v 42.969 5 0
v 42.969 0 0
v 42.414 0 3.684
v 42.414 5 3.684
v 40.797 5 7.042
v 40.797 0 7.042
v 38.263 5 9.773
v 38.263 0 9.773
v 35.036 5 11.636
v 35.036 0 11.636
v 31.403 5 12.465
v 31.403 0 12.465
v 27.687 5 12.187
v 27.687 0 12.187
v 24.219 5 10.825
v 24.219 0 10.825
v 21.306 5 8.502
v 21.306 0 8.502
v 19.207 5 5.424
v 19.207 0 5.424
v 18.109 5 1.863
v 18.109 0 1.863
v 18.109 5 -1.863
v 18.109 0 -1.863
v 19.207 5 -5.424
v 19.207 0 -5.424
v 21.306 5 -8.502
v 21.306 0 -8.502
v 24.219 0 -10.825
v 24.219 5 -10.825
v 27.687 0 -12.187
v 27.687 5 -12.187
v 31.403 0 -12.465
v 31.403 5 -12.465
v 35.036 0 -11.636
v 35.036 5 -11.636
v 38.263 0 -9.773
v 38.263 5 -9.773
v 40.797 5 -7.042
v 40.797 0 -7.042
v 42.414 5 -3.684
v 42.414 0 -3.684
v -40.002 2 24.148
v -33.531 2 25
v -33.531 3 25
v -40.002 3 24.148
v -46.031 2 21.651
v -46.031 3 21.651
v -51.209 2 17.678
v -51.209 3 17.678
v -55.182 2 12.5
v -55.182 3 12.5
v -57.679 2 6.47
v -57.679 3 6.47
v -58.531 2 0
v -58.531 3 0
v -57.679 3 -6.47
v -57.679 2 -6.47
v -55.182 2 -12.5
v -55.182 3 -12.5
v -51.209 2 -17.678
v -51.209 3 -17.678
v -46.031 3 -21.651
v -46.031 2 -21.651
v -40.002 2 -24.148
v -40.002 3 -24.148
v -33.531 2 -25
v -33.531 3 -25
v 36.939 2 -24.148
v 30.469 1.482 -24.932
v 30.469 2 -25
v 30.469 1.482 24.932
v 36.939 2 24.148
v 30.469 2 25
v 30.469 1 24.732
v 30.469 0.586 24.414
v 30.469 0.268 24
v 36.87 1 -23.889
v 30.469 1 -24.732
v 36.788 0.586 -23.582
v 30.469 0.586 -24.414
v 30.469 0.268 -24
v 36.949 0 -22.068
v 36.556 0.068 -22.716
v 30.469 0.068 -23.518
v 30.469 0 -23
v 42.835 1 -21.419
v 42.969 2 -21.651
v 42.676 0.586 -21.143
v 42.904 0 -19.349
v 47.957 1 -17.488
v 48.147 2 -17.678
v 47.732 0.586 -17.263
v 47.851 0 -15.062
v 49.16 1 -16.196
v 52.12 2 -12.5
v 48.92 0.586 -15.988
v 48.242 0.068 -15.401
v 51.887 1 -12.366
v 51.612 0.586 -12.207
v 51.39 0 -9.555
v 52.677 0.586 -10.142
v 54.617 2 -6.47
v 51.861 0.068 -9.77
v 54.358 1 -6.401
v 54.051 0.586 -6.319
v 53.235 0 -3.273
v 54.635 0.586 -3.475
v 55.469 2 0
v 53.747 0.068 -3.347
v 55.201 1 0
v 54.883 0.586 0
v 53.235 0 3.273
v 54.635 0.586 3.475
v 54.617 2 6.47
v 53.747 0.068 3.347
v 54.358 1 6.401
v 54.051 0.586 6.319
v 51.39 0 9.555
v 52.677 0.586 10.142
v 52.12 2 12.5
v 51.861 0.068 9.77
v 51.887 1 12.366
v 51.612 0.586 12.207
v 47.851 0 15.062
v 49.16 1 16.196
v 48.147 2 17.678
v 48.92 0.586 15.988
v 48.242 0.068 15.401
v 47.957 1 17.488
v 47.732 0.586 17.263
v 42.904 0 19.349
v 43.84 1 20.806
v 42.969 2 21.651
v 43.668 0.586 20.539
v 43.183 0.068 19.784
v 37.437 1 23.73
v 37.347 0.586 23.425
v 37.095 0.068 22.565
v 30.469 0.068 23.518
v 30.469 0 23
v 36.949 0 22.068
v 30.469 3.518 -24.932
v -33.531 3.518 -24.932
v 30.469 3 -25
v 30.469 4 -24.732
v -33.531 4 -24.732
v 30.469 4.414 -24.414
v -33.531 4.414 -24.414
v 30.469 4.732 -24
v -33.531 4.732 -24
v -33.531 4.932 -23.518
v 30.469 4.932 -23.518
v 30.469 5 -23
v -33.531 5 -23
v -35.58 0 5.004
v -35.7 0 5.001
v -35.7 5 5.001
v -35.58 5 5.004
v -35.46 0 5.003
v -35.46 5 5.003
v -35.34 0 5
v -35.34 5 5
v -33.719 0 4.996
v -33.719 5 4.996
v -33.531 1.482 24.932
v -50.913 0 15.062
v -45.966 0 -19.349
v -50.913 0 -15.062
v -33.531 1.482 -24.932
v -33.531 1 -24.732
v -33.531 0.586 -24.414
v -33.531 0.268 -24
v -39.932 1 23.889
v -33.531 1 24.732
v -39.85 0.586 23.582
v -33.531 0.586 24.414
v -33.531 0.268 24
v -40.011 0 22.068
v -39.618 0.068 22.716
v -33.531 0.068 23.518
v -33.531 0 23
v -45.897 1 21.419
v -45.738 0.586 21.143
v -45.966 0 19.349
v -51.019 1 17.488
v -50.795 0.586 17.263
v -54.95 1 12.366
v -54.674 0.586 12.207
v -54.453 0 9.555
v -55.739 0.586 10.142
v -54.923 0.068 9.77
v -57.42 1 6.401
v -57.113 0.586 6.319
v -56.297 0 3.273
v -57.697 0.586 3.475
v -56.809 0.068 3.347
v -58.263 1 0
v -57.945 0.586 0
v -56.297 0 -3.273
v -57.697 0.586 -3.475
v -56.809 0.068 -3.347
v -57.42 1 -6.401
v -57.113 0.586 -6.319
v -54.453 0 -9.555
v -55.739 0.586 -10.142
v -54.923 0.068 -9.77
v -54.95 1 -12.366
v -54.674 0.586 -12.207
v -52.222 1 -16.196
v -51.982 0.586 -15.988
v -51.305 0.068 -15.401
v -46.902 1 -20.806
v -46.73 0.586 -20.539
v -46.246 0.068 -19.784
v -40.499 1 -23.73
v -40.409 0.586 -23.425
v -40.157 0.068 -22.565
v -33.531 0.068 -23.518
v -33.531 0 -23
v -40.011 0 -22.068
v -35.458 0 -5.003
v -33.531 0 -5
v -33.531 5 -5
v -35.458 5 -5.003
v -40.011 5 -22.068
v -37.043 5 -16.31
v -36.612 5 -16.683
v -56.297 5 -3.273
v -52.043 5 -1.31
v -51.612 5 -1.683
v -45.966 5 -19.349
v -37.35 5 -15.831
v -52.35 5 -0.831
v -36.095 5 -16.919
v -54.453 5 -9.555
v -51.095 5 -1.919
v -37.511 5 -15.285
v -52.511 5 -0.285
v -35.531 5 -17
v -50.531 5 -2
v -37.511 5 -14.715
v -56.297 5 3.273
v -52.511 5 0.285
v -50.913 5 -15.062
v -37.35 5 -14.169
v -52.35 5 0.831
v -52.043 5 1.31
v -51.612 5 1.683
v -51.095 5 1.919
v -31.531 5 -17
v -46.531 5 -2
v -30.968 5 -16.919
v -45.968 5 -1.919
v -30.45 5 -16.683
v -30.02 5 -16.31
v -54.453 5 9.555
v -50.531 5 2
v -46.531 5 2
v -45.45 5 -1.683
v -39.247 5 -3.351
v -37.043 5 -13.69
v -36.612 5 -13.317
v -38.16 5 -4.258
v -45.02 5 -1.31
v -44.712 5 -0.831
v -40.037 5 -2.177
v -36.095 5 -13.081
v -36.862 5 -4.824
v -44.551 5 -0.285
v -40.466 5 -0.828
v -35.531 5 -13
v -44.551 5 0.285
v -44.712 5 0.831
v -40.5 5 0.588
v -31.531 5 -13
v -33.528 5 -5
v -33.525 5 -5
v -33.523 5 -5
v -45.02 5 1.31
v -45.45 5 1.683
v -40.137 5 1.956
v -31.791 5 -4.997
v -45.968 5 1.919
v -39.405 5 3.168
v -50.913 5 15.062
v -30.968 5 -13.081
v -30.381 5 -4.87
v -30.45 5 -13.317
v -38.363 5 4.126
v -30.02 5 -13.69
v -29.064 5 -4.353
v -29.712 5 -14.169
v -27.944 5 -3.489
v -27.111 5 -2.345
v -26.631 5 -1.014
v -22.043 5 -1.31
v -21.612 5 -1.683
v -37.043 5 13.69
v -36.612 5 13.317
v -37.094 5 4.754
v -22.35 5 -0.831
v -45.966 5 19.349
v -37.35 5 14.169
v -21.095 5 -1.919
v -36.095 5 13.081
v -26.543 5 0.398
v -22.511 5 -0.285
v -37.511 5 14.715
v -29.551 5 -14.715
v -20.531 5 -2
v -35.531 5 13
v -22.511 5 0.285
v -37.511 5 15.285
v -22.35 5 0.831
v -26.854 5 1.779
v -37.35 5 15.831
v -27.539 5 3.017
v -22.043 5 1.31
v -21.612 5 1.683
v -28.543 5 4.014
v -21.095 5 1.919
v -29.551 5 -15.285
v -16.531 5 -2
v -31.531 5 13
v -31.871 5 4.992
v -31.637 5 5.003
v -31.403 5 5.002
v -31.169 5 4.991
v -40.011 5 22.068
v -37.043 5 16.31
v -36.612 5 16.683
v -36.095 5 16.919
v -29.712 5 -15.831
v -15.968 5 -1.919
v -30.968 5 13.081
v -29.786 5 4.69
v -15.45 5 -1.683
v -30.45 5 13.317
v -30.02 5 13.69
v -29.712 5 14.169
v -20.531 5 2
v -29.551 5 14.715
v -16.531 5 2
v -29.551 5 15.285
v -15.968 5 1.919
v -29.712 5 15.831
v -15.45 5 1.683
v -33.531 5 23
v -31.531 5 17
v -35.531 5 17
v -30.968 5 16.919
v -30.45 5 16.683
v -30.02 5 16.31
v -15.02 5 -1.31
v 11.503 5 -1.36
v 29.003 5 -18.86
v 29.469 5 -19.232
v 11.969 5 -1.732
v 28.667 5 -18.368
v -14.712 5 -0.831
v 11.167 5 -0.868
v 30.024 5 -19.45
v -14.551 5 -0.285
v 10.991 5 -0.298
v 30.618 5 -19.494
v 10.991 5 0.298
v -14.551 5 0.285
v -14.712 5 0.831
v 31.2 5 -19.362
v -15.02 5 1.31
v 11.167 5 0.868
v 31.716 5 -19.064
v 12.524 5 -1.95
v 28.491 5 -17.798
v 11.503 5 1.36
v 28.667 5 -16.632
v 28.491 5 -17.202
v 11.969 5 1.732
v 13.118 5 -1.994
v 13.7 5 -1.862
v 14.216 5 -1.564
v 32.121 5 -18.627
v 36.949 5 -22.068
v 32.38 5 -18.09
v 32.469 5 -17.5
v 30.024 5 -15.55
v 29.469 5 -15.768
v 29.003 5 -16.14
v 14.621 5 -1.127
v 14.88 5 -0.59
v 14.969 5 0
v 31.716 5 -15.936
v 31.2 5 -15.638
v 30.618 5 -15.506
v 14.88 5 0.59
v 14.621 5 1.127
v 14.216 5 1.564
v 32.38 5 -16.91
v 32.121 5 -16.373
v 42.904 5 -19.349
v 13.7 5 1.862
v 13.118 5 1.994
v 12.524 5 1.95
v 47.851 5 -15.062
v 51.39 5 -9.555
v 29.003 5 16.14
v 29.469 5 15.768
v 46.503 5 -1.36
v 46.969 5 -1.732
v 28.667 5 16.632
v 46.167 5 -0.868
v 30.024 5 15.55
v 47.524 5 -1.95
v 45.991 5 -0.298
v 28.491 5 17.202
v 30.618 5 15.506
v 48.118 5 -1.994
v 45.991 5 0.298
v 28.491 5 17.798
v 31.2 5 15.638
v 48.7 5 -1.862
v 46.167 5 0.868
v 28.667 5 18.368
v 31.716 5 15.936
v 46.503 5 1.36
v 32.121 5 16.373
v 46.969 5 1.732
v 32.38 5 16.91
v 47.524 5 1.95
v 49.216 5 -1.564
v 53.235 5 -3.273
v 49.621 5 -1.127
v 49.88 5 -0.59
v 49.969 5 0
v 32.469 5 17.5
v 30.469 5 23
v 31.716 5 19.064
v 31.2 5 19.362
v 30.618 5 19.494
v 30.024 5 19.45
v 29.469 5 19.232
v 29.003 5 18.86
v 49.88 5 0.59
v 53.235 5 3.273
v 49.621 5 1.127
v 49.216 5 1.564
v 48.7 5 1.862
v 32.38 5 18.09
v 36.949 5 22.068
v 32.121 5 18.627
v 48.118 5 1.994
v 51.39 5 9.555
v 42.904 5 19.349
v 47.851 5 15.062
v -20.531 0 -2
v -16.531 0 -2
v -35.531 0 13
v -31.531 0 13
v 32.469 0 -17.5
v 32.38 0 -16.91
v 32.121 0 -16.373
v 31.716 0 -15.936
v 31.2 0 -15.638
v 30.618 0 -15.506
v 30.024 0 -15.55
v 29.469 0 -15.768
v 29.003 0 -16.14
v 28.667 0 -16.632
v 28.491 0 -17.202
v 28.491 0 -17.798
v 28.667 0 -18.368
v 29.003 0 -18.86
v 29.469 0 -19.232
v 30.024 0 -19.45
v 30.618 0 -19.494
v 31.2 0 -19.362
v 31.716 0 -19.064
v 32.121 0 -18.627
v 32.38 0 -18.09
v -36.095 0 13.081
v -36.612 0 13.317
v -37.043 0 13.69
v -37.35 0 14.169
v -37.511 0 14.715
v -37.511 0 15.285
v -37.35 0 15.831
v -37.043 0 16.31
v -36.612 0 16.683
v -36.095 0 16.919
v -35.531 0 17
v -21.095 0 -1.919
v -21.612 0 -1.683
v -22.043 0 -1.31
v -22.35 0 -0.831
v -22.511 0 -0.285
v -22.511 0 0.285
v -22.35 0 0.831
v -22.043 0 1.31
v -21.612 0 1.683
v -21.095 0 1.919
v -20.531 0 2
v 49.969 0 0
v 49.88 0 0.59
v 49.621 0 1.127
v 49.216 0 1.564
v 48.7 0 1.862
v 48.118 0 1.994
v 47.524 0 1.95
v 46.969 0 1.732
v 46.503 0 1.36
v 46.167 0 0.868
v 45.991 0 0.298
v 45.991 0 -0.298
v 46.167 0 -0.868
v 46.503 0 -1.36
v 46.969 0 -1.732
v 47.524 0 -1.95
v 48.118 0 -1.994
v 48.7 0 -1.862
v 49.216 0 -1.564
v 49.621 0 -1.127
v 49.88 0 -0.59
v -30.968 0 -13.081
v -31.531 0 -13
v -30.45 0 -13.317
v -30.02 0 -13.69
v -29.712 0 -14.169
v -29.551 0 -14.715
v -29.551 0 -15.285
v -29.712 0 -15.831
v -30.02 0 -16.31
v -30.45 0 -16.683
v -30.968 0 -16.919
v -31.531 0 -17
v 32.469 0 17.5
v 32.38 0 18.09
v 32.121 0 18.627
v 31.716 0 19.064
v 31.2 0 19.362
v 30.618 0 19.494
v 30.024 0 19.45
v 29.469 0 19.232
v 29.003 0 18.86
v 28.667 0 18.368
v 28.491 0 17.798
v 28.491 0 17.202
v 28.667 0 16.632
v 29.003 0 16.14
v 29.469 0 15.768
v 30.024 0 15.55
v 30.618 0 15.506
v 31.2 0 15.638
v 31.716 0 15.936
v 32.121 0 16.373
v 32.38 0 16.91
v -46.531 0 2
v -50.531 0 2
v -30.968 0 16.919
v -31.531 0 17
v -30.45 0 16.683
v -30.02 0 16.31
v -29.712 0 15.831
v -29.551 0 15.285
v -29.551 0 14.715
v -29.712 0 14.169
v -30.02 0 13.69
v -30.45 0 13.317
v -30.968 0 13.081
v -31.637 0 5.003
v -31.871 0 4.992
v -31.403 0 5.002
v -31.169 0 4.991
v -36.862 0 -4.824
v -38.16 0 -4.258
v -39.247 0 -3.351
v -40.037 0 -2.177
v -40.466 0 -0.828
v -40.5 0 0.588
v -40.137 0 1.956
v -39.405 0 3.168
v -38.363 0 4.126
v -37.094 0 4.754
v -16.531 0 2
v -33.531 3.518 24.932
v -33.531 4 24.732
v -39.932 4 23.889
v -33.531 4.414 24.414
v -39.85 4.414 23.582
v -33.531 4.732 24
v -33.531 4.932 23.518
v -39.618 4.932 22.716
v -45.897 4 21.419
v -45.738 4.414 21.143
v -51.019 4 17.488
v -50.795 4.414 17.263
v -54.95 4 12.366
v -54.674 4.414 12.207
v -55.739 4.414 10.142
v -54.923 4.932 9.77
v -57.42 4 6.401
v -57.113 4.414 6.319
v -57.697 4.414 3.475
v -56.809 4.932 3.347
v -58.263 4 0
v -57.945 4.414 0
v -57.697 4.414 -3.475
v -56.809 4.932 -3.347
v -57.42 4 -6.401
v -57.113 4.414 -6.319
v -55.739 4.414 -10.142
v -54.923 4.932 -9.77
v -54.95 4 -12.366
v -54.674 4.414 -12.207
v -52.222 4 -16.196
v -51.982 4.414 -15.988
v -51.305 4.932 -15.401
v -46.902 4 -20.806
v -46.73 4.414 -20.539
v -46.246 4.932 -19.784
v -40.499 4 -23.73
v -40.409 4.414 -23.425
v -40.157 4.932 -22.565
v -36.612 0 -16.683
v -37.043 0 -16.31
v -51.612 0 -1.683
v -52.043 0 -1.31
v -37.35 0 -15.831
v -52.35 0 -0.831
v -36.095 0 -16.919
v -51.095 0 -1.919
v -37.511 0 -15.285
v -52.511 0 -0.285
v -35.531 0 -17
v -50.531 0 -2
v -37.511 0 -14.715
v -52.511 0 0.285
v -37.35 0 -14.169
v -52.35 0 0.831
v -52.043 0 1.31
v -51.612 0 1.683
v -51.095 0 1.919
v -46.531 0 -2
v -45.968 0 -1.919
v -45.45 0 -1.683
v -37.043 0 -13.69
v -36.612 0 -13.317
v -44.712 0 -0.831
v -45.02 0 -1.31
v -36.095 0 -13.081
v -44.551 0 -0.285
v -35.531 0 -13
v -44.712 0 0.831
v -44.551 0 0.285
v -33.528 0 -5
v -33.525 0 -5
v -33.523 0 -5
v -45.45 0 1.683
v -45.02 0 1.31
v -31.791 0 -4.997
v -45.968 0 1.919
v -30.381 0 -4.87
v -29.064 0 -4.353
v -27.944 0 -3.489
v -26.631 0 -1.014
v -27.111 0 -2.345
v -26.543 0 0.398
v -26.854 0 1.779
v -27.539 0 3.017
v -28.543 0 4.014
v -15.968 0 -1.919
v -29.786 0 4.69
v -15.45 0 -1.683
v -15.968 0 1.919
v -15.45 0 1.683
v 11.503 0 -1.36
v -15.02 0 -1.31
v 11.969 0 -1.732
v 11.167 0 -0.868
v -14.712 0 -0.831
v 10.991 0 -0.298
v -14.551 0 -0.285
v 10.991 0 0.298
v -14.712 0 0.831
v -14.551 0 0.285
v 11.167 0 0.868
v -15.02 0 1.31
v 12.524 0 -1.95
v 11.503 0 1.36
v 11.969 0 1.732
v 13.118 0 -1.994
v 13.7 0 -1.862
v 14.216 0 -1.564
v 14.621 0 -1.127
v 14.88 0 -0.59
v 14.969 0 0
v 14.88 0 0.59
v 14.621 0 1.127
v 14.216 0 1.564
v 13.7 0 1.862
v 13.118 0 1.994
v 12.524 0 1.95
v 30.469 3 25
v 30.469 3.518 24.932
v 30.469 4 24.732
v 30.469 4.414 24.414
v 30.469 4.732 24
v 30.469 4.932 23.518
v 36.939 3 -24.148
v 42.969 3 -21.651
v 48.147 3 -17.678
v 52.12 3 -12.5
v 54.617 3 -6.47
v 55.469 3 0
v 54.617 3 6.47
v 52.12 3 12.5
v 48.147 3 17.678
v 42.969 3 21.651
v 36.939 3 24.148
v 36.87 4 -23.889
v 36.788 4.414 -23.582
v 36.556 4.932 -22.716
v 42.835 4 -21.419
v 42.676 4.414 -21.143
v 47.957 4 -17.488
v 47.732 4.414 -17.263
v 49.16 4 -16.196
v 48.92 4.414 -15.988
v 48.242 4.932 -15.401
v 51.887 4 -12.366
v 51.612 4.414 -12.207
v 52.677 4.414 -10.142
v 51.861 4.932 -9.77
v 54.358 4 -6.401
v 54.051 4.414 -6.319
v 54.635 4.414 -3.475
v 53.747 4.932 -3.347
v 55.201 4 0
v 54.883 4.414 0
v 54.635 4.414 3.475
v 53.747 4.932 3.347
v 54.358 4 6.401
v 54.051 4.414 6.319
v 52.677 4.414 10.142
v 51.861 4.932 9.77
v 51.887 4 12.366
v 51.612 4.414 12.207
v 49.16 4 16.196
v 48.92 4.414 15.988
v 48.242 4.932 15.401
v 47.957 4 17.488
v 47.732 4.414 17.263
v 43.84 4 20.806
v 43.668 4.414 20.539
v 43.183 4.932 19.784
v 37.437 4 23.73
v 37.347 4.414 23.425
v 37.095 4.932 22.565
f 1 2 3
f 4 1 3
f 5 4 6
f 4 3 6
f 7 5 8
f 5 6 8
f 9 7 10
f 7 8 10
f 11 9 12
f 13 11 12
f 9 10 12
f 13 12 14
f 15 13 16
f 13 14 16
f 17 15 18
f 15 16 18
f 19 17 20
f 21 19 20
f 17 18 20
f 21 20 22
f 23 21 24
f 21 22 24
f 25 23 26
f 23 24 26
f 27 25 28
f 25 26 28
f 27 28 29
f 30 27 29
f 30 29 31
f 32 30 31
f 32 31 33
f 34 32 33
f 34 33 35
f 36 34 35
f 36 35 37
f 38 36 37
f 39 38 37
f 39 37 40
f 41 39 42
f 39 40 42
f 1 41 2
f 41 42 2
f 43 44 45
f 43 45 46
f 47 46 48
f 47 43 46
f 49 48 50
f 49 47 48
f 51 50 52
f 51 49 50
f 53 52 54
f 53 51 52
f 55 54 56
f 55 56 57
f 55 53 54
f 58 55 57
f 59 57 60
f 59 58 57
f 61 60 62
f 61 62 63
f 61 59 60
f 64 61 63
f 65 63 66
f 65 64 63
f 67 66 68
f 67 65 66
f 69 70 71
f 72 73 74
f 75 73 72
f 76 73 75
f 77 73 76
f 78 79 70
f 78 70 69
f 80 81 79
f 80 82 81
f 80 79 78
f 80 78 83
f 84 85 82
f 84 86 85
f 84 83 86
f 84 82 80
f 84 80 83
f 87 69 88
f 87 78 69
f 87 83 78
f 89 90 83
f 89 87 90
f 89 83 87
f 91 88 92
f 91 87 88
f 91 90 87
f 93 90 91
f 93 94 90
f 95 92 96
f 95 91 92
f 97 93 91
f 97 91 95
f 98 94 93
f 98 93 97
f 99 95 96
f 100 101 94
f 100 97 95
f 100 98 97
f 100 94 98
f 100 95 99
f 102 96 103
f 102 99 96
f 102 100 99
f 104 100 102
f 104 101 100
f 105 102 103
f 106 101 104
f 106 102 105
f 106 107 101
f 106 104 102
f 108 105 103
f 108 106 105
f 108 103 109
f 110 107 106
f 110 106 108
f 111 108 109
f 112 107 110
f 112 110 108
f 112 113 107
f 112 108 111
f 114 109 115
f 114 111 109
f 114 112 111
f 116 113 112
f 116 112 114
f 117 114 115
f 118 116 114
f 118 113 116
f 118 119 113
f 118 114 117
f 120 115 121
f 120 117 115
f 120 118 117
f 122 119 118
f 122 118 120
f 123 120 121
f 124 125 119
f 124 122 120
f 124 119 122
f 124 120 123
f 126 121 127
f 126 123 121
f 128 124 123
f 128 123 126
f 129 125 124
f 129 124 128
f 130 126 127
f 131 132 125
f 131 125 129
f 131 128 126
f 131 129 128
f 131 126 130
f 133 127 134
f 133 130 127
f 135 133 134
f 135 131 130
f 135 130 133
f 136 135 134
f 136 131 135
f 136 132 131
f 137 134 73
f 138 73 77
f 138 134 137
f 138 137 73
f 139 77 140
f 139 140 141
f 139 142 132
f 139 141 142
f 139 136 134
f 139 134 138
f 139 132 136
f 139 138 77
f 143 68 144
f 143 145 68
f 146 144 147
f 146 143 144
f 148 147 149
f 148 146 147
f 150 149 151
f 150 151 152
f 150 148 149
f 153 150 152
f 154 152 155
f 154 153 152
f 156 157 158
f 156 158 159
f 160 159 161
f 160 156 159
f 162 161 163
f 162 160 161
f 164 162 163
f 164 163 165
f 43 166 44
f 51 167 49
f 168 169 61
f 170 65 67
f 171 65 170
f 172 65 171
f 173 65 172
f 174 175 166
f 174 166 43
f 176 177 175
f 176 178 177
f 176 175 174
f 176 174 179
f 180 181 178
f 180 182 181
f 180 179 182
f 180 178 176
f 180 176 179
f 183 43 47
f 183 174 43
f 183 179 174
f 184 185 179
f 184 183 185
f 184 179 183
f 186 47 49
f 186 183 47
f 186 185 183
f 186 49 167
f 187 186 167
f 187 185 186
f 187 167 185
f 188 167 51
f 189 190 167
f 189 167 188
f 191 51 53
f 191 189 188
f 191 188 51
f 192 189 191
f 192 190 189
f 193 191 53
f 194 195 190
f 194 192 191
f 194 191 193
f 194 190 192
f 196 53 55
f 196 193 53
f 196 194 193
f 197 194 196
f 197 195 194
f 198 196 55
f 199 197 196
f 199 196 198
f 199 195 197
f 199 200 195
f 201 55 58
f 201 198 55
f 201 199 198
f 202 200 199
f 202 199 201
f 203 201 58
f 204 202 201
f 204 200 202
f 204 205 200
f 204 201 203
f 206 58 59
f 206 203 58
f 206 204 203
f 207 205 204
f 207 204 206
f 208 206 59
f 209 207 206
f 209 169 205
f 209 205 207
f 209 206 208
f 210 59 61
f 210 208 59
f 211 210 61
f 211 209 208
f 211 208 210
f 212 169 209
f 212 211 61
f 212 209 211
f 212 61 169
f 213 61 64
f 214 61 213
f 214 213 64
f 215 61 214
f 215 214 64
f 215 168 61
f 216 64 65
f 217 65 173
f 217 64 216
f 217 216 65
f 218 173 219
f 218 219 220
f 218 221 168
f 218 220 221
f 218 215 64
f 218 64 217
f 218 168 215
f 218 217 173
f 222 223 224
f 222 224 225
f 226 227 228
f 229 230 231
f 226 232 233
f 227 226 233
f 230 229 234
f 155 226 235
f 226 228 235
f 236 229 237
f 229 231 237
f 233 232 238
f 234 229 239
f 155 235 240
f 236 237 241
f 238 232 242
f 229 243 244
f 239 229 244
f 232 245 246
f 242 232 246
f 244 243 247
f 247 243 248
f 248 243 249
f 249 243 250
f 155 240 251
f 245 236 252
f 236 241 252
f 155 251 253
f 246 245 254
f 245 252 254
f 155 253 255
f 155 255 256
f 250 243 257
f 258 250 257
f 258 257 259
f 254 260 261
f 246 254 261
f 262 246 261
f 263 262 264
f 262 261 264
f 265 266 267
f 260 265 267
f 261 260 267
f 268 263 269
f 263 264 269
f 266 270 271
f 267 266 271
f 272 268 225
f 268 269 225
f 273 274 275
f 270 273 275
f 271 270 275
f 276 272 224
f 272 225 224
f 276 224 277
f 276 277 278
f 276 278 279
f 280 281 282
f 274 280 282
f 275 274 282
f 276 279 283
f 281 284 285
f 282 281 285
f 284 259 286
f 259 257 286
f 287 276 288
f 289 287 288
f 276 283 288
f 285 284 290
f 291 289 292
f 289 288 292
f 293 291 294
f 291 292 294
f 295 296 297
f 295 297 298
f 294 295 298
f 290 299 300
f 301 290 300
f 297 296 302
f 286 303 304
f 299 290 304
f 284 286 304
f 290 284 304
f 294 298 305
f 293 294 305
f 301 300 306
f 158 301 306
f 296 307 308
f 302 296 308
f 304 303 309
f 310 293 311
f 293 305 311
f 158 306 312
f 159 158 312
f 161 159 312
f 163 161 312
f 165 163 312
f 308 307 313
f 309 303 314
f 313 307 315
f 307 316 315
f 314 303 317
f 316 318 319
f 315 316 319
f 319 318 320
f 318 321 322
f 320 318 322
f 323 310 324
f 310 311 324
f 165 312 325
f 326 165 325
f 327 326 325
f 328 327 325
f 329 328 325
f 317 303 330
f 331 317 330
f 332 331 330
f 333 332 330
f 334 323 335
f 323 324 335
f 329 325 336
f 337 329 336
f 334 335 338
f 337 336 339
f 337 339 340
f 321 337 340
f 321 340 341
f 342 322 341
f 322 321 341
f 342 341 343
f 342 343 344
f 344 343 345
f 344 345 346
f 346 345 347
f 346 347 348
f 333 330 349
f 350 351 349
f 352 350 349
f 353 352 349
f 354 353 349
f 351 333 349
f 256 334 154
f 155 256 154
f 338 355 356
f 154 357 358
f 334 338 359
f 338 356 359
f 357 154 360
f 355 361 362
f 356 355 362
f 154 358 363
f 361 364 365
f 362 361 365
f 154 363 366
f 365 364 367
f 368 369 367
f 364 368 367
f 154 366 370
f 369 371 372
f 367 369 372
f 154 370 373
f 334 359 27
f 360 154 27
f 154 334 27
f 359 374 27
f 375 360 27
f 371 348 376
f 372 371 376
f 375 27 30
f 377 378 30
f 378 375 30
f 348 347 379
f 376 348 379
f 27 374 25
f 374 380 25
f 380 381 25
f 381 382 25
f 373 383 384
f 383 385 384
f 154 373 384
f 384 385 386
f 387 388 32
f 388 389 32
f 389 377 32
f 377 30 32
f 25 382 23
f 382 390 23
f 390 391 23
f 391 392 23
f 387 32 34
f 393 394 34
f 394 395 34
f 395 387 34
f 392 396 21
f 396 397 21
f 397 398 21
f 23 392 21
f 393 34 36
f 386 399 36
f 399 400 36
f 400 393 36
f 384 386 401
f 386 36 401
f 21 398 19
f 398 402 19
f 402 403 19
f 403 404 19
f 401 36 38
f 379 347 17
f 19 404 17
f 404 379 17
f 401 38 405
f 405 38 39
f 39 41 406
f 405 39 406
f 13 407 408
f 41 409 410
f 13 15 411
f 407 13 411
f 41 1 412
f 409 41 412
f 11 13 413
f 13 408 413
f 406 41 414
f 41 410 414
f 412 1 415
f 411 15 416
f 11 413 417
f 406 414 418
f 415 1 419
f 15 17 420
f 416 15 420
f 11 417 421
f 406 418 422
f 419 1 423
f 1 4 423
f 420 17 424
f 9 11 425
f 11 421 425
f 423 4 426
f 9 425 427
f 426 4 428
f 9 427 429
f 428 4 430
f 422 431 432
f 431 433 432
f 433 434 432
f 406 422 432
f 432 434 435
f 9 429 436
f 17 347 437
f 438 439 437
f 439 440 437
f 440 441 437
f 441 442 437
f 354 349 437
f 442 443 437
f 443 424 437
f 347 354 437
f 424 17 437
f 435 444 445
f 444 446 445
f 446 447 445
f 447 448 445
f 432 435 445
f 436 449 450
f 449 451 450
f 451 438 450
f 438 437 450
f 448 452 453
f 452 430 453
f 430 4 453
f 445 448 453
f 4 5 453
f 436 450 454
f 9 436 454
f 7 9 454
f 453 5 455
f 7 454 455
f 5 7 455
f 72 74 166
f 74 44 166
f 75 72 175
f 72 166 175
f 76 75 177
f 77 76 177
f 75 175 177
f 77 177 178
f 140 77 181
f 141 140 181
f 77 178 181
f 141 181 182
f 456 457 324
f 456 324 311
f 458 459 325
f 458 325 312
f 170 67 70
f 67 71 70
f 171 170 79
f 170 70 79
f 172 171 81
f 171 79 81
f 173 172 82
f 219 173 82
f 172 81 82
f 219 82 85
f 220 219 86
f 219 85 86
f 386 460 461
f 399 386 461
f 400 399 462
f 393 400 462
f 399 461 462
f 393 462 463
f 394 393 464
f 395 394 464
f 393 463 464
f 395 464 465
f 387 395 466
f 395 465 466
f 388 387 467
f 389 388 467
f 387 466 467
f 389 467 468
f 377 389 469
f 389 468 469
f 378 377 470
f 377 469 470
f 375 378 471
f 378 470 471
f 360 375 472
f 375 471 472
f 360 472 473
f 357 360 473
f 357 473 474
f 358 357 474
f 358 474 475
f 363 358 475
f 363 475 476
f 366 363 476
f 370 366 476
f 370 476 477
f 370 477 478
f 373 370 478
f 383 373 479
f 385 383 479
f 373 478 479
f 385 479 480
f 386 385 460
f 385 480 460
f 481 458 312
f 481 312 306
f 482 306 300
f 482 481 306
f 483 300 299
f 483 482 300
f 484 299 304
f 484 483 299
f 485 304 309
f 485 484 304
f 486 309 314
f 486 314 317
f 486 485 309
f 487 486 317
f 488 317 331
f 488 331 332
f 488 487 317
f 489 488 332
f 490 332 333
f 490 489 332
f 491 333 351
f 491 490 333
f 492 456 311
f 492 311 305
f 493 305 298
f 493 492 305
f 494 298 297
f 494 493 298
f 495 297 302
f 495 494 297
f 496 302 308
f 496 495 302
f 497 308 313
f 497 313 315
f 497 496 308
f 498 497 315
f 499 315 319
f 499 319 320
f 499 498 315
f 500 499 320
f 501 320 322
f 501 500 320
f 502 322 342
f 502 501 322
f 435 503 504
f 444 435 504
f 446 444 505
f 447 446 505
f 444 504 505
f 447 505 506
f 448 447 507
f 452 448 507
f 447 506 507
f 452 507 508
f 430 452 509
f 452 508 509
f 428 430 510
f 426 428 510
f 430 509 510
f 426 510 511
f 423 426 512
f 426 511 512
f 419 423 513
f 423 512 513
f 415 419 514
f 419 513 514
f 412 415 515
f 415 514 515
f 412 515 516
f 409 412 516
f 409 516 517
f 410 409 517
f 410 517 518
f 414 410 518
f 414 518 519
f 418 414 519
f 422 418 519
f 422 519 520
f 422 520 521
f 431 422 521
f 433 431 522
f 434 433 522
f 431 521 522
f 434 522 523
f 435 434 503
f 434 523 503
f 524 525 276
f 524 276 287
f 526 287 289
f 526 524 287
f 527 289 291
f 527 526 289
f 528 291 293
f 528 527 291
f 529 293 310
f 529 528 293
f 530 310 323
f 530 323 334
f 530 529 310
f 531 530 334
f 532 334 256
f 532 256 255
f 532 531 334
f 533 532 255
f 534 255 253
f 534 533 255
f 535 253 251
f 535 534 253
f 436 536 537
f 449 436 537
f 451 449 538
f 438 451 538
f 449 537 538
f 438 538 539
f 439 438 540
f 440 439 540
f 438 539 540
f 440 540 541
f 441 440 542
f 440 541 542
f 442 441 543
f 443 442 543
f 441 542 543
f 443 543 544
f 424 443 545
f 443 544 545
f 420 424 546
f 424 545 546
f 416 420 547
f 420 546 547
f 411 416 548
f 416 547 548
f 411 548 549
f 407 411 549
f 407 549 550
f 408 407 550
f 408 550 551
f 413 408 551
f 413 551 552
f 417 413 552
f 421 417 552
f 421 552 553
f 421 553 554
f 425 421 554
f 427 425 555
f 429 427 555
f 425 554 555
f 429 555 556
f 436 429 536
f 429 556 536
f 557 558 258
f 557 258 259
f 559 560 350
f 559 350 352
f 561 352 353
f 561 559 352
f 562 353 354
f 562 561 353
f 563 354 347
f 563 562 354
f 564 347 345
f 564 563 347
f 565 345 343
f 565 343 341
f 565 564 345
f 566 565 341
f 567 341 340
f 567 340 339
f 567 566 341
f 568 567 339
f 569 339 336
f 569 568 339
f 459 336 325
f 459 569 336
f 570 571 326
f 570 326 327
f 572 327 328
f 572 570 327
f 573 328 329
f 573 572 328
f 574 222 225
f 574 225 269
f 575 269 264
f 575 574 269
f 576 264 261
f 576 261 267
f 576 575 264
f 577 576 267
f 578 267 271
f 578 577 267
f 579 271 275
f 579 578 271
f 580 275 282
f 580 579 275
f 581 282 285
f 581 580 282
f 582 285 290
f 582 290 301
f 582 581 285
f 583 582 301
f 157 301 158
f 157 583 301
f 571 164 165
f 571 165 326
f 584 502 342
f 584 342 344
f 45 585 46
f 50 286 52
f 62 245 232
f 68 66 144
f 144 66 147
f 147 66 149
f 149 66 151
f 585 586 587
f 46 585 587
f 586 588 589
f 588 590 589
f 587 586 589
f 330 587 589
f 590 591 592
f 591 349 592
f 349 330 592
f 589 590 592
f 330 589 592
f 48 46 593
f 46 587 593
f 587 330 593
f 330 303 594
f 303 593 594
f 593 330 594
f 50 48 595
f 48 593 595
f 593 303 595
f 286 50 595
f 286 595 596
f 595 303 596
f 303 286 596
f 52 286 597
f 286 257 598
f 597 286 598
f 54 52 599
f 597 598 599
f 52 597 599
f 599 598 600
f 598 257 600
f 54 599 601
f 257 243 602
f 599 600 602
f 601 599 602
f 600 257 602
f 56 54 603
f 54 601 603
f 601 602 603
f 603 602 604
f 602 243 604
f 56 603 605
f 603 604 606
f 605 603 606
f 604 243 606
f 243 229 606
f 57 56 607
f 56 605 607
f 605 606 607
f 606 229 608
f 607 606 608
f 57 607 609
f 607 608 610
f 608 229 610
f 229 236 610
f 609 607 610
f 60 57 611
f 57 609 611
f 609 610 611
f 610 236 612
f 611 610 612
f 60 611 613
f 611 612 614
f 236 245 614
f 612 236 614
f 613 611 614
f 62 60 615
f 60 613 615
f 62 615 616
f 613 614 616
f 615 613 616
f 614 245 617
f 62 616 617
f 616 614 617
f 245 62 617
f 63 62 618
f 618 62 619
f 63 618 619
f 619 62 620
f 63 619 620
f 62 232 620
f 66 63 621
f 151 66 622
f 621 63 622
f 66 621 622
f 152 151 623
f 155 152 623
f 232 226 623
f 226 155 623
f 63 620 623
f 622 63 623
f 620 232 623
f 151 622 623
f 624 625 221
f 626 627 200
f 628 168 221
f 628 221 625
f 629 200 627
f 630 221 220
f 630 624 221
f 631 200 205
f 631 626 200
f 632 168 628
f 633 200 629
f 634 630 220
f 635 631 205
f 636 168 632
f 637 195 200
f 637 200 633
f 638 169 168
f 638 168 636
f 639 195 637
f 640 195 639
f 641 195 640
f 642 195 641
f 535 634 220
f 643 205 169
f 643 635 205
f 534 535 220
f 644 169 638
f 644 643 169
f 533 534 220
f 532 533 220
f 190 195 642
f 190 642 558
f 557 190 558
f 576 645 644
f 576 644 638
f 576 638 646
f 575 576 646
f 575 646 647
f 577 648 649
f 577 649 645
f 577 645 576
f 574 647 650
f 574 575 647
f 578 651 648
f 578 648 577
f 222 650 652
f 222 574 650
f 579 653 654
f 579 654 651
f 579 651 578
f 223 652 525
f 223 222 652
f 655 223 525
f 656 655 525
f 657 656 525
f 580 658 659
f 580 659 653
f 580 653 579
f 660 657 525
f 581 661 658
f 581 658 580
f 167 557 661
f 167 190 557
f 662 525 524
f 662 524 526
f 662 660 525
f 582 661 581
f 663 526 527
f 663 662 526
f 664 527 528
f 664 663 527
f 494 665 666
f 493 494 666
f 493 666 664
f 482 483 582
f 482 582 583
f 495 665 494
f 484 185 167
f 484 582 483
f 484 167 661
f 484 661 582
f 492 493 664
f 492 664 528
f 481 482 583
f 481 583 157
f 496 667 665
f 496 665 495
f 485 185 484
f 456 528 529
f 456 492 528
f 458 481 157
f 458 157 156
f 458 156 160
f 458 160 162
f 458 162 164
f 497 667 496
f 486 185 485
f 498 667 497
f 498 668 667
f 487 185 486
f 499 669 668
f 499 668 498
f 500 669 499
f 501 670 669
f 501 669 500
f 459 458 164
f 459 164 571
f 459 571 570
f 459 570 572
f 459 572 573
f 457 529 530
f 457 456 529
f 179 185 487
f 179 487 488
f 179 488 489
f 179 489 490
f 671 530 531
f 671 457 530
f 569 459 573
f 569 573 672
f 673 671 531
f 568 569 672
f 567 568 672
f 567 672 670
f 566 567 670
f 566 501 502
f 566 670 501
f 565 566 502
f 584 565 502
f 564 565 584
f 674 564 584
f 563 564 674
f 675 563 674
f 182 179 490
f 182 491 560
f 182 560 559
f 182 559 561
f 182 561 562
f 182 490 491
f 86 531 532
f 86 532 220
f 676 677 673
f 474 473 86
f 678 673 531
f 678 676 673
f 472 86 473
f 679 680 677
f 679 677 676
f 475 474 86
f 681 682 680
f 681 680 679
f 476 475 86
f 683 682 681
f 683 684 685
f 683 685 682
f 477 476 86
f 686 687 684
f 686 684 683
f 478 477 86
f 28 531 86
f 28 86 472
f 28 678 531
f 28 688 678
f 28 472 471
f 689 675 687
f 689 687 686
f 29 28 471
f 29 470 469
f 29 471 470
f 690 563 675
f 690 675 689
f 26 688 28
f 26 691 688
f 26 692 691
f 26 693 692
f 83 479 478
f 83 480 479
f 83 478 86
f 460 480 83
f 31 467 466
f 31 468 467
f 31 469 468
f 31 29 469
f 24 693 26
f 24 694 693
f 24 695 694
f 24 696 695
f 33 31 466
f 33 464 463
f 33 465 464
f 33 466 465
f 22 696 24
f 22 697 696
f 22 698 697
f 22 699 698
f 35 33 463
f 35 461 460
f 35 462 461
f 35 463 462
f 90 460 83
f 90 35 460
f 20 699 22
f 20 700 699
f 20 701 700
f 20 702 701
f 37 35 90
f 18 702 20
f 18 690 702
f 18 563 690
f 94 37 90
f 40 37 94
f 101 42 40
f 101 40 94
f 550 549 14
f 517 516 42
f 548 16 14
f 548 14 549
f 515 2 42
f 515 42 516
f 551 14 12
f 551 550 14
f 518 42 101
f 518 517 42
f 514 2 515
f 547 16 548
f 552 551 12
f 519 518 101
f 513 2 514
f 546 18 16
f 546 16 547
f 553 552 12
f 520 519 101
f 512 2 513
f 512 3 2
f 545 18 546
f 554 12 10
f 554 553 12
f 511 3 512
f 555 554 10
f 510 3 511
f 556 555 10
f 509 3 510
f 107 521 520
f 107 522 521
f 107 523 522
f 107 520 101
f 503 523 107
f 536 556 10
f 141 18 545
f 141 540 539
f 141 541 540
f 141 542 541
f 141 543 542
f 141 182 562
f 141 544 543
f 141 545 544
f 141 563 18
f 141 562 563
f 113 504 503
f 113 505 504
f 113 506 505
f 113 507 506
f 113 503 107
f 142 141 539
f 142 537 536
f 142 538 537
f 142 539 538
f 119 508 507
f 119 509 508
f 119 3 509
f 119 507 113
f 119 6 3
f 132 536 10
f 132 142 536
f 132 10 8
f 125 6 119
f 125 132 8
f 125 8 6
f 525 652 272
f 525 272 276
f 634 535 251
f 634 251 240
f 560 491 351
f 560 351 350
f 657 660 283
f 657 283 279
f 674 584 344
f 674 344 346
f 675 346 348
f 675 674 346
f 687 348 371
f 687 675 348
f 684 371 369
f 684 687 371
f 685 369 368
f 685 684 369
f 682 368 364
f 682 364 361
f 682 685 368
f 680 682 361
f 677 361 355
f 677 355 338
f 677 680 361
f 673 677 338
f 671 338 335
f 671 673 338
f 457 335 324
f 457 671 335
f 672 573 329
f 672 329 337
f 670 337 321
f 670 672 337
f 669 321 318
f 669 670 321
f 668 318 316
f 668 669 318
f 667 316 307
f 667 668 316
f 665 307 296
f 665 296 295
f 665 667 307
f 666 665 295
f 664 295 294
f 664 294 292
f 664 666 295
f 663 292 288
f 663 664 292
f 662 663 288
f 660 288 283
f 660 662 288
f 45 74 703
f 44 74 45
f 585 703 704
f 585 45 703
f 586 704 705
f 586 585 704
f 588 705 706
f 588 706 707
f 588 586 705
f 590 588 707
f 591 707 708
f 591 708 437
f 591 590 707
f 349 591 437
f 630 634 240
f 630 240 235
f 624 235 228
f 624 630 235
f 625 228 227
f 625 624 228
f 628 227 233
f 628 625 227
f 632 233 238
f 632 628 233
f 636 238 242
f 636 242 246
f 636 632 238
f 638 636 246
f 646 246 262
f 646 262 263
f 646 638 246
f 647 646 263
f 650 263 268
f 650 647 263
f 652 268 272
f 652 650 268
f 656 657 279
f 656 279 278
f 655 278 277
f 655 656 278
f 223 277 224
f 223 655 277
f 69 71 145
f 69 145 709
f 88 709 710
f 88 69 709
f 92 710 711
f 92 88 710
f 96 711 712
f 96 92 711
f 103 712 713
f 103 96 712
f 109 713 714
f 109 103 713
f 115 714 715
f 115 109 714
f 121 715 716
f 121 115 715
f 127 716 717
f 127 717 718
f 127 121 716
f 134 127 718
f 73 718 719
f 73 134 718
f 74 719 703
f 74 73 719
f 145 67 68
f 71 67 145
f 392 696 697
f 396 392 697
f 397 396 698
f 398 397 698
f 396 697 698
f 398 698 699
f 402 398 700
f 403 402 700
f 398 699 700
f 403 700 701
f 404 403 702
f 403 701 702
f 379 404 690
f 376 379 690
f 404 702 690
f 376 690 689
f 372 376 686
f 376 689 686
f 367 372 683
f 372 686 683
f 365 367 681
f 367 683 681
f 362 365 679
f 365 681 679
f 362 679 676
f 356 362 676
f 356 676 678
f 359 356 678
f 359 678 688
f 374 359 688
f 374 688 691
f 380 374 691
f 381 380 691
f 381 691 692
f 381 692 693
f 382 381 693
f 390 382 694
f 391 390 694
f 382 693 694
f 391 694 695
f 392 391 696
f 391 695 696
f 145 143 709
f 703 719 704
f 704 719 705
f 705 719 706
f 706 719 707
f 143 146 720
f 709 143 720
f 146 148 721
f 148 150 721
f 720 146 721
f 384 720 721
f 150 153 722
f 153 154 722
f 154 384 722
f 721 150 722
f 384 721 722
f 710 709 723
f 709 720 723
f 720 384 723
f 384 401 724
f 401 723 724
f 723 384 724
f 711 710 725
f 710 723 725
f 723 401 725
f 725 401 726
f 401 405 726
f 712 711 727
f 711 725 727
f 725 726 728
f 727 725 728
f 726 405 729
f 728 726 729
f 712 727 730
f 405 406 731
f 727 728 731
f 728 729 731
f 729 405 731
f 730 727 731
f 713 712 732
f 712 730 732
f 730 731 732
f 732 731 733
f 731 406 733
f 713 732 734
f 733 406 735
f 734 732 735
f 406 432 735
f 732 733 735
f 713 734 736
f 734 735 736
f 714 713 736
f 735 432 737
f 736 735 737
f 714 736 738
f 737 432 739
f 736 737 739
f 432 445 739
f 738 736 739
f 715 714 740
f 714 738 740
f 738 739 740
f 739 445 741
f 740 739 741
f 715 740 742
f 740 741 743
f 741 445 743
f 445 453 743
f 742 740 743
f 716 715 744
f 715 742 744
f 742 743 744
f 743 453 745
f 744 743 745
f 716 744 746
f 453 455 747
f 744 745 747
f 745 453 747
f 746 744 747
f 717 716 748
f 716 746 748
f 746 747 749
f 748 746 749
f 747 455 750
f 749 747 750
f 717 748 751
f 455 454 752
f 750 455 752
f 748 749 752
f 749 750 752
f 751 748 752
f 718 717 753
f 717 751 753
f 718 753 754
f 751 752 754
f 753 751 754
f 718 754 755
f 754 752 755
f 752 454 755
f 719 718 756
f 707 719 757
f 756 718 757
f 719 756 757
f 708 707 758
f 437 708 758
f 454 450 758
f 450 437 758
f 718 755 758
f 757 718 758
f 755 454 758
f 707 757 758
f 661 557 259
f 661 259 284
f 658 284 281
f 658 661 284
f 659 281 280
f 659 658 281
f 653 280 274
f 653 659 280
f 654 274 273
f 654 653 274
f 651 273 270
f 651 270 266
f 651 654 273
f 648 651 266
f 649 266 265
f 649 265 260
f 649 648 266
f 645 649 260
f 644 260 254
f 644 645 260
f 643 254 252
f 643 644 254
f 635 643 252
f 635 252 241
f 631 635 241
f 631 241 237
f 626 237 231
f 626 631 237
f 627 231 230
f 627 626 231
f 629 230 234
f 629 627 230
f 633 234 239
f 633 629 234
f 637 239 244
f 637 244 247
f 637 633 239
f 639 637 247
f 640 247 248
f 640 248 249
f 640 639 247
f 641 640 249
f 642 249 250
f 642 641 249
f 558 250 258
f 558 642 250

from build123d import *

# Parameters (mm, degrees)
F0_R     = 2
F0_R_2   = 12.5
F1_DEPTH = 5
F2_R     = 2


# Not quite as in the source:
# - two fillets or chamfers of one size are made in one step
# - ends of sketch curves that miss each other by under 0.0002 mm in the source are joined


with BuildPart() as f1:
    # F0 (on Front) → F1 (new body)
    with BuildSketch(Plane.XZ):
        with BuildLine():
            Line((30.4688991789, 25), (-33.5311008211, 25))
            ThreePointArc((-33.5311008211, 25), (-58.5311008211, 0), (-33.5311008211, -25))
            Line((-33.5311008211, -25), (30.4688991789, -25))
            ThreePointArc((30.4688991789, -25), (55.4688991789, 0), (30.4688991789, 25))
        make_face()
        with BuildLine():
            ThreePointArc((-31.5311008211, -13), (-29.5311008211, -15), (-31.5311008211, -17))
            Line((-31.5311008211, -17), (-35.5311008211, -17))
            ThreePointArc((-35.5311008211, -17), (-37.5311008211, -15), (-35.5311008211, -13))
            Line((-35.5311008211, -13), (-31.5311008211, -13))
        make_face(mode=Mode.SUBTRACT)
        with BuildLine():
            ThreePointArc((-35.6998849753, 5.0009525442), (-35.5197441178, 5.0037871123), (-35.3396179829, 5.0001348744))
            Line((-35.3396179829, 5.0001348744), (-33.7192871231, 4.9964573365))
            Line((-33.7192871231, 4.9964573365), (-31.8707135701, 4.9922617741))
            ThreePointArc((-31.8707135701, 4.9922617741), (-31.5197441178, 5.0037871123), (-31.1688305974, 4.9906687653))
            ThreePointArc((-31.1688305974, 4.9906687653), (-26.5369680234, -0.310889109), (-31.7905758861, -4.9970678533))
            Line((-31.7905758861, -4.9970678533), (-33.5226571845, -4.9999928705))
            ThreePointArc((-33.5226571845, -4.9999928705), (-33.5268790013, -4.9999982176), (-33.5311008211, -5))
            Line((-33.5311008211, -5), (-35.4576247605, -5.0032605078))
            ThreePointArc((-35.4576247605, -5.0032605078), (-40.5334343372, -0.1211356041), (-35.6998849753, 5.0009525442))
        make_face(mode=Mode.SUBTRACT)
        with Locations((30.4688991789, -17.5)):
            Circle(F0_R, mode=Mode.SUBTRACT)
        with BuildLine():
            ThreePointArc((-46.5311008211, 2), (-44.5311008211, 0), (-46.5311008211, -2))
            Line((-46.5311008211, -2), (-50.5311008211, -2))
            ThreePointArc((-50.5311008211, -2), (-52.5311008211, 0), (-50.5311008211, 2))
            Line((-50.5311008211, 2), (-46.5311008211, 2))
        make_face(mode=Mode.SUBTRACT)
        with BuildLine():
            ThreePointArc((-20.5311008211, -2), (-22.5311008211, 0), (-20.5311008211, 2))
            Line((-20.5311008211, 2), (-16.5311008211, 2))
            ThreePointArc((-16.5311008211, 2), (-14.5311008211, 0), (-16.5311008211, -2))
            Line((-16.5311008211, -2), (-20.5311008211, -2))
        make_face(mode=Mode.SUBTRACT)
        with BuildLine():
            ThreePointArc((-31.5311008211, 17), (-29.5311008211, 15), (-31.5311008211, 13))
            Line((-31.5311008211, 13), (-35.5311008211, 13))
            ThreePointArc((-35.5311008211, 13), (-37.5311008211, 15), (-35.5311008211, 17))
            Line((-35.5311008211, 17), (-31.5311008211, 17))
        make_face(mode=Mode.SUBTRACT)
        with Locations((12.9688991789, 0)):
            Circle(F0_R, mode=Mode.SUBTRACT)
        with Locations((30.4688991789, 0)):
            Circle(F0_R_2, mode=Mode.SUBTRACT)
        with Locations((47.9688991789, 0)):
            Circle(F0_R, mode=Mode.SUBTRACT)
        with Locations((30.4688991789, 17.5)):
            Circle(F0_R, mode=Mode.SUBTRACT)
    extrude(amount=-F1_DEPTH)

    # F2
    f2_edges = [f1.edges().sort_by_distance(p)[0] for p in [
        (55.468899, 5, 0),
        (-1.531101, 0, 25),
        (-1.531101, 5, 25),
        (-58.531101, 5, 0),
        (-1.531101, 5, -25),
        (-1.531101, 0, -25),
        (-58.531101, 0, 0),
        (55.468899, 0, 0),
    ]]
    fillet(f2_edges, radius=F2_R)


solid = f1.part
